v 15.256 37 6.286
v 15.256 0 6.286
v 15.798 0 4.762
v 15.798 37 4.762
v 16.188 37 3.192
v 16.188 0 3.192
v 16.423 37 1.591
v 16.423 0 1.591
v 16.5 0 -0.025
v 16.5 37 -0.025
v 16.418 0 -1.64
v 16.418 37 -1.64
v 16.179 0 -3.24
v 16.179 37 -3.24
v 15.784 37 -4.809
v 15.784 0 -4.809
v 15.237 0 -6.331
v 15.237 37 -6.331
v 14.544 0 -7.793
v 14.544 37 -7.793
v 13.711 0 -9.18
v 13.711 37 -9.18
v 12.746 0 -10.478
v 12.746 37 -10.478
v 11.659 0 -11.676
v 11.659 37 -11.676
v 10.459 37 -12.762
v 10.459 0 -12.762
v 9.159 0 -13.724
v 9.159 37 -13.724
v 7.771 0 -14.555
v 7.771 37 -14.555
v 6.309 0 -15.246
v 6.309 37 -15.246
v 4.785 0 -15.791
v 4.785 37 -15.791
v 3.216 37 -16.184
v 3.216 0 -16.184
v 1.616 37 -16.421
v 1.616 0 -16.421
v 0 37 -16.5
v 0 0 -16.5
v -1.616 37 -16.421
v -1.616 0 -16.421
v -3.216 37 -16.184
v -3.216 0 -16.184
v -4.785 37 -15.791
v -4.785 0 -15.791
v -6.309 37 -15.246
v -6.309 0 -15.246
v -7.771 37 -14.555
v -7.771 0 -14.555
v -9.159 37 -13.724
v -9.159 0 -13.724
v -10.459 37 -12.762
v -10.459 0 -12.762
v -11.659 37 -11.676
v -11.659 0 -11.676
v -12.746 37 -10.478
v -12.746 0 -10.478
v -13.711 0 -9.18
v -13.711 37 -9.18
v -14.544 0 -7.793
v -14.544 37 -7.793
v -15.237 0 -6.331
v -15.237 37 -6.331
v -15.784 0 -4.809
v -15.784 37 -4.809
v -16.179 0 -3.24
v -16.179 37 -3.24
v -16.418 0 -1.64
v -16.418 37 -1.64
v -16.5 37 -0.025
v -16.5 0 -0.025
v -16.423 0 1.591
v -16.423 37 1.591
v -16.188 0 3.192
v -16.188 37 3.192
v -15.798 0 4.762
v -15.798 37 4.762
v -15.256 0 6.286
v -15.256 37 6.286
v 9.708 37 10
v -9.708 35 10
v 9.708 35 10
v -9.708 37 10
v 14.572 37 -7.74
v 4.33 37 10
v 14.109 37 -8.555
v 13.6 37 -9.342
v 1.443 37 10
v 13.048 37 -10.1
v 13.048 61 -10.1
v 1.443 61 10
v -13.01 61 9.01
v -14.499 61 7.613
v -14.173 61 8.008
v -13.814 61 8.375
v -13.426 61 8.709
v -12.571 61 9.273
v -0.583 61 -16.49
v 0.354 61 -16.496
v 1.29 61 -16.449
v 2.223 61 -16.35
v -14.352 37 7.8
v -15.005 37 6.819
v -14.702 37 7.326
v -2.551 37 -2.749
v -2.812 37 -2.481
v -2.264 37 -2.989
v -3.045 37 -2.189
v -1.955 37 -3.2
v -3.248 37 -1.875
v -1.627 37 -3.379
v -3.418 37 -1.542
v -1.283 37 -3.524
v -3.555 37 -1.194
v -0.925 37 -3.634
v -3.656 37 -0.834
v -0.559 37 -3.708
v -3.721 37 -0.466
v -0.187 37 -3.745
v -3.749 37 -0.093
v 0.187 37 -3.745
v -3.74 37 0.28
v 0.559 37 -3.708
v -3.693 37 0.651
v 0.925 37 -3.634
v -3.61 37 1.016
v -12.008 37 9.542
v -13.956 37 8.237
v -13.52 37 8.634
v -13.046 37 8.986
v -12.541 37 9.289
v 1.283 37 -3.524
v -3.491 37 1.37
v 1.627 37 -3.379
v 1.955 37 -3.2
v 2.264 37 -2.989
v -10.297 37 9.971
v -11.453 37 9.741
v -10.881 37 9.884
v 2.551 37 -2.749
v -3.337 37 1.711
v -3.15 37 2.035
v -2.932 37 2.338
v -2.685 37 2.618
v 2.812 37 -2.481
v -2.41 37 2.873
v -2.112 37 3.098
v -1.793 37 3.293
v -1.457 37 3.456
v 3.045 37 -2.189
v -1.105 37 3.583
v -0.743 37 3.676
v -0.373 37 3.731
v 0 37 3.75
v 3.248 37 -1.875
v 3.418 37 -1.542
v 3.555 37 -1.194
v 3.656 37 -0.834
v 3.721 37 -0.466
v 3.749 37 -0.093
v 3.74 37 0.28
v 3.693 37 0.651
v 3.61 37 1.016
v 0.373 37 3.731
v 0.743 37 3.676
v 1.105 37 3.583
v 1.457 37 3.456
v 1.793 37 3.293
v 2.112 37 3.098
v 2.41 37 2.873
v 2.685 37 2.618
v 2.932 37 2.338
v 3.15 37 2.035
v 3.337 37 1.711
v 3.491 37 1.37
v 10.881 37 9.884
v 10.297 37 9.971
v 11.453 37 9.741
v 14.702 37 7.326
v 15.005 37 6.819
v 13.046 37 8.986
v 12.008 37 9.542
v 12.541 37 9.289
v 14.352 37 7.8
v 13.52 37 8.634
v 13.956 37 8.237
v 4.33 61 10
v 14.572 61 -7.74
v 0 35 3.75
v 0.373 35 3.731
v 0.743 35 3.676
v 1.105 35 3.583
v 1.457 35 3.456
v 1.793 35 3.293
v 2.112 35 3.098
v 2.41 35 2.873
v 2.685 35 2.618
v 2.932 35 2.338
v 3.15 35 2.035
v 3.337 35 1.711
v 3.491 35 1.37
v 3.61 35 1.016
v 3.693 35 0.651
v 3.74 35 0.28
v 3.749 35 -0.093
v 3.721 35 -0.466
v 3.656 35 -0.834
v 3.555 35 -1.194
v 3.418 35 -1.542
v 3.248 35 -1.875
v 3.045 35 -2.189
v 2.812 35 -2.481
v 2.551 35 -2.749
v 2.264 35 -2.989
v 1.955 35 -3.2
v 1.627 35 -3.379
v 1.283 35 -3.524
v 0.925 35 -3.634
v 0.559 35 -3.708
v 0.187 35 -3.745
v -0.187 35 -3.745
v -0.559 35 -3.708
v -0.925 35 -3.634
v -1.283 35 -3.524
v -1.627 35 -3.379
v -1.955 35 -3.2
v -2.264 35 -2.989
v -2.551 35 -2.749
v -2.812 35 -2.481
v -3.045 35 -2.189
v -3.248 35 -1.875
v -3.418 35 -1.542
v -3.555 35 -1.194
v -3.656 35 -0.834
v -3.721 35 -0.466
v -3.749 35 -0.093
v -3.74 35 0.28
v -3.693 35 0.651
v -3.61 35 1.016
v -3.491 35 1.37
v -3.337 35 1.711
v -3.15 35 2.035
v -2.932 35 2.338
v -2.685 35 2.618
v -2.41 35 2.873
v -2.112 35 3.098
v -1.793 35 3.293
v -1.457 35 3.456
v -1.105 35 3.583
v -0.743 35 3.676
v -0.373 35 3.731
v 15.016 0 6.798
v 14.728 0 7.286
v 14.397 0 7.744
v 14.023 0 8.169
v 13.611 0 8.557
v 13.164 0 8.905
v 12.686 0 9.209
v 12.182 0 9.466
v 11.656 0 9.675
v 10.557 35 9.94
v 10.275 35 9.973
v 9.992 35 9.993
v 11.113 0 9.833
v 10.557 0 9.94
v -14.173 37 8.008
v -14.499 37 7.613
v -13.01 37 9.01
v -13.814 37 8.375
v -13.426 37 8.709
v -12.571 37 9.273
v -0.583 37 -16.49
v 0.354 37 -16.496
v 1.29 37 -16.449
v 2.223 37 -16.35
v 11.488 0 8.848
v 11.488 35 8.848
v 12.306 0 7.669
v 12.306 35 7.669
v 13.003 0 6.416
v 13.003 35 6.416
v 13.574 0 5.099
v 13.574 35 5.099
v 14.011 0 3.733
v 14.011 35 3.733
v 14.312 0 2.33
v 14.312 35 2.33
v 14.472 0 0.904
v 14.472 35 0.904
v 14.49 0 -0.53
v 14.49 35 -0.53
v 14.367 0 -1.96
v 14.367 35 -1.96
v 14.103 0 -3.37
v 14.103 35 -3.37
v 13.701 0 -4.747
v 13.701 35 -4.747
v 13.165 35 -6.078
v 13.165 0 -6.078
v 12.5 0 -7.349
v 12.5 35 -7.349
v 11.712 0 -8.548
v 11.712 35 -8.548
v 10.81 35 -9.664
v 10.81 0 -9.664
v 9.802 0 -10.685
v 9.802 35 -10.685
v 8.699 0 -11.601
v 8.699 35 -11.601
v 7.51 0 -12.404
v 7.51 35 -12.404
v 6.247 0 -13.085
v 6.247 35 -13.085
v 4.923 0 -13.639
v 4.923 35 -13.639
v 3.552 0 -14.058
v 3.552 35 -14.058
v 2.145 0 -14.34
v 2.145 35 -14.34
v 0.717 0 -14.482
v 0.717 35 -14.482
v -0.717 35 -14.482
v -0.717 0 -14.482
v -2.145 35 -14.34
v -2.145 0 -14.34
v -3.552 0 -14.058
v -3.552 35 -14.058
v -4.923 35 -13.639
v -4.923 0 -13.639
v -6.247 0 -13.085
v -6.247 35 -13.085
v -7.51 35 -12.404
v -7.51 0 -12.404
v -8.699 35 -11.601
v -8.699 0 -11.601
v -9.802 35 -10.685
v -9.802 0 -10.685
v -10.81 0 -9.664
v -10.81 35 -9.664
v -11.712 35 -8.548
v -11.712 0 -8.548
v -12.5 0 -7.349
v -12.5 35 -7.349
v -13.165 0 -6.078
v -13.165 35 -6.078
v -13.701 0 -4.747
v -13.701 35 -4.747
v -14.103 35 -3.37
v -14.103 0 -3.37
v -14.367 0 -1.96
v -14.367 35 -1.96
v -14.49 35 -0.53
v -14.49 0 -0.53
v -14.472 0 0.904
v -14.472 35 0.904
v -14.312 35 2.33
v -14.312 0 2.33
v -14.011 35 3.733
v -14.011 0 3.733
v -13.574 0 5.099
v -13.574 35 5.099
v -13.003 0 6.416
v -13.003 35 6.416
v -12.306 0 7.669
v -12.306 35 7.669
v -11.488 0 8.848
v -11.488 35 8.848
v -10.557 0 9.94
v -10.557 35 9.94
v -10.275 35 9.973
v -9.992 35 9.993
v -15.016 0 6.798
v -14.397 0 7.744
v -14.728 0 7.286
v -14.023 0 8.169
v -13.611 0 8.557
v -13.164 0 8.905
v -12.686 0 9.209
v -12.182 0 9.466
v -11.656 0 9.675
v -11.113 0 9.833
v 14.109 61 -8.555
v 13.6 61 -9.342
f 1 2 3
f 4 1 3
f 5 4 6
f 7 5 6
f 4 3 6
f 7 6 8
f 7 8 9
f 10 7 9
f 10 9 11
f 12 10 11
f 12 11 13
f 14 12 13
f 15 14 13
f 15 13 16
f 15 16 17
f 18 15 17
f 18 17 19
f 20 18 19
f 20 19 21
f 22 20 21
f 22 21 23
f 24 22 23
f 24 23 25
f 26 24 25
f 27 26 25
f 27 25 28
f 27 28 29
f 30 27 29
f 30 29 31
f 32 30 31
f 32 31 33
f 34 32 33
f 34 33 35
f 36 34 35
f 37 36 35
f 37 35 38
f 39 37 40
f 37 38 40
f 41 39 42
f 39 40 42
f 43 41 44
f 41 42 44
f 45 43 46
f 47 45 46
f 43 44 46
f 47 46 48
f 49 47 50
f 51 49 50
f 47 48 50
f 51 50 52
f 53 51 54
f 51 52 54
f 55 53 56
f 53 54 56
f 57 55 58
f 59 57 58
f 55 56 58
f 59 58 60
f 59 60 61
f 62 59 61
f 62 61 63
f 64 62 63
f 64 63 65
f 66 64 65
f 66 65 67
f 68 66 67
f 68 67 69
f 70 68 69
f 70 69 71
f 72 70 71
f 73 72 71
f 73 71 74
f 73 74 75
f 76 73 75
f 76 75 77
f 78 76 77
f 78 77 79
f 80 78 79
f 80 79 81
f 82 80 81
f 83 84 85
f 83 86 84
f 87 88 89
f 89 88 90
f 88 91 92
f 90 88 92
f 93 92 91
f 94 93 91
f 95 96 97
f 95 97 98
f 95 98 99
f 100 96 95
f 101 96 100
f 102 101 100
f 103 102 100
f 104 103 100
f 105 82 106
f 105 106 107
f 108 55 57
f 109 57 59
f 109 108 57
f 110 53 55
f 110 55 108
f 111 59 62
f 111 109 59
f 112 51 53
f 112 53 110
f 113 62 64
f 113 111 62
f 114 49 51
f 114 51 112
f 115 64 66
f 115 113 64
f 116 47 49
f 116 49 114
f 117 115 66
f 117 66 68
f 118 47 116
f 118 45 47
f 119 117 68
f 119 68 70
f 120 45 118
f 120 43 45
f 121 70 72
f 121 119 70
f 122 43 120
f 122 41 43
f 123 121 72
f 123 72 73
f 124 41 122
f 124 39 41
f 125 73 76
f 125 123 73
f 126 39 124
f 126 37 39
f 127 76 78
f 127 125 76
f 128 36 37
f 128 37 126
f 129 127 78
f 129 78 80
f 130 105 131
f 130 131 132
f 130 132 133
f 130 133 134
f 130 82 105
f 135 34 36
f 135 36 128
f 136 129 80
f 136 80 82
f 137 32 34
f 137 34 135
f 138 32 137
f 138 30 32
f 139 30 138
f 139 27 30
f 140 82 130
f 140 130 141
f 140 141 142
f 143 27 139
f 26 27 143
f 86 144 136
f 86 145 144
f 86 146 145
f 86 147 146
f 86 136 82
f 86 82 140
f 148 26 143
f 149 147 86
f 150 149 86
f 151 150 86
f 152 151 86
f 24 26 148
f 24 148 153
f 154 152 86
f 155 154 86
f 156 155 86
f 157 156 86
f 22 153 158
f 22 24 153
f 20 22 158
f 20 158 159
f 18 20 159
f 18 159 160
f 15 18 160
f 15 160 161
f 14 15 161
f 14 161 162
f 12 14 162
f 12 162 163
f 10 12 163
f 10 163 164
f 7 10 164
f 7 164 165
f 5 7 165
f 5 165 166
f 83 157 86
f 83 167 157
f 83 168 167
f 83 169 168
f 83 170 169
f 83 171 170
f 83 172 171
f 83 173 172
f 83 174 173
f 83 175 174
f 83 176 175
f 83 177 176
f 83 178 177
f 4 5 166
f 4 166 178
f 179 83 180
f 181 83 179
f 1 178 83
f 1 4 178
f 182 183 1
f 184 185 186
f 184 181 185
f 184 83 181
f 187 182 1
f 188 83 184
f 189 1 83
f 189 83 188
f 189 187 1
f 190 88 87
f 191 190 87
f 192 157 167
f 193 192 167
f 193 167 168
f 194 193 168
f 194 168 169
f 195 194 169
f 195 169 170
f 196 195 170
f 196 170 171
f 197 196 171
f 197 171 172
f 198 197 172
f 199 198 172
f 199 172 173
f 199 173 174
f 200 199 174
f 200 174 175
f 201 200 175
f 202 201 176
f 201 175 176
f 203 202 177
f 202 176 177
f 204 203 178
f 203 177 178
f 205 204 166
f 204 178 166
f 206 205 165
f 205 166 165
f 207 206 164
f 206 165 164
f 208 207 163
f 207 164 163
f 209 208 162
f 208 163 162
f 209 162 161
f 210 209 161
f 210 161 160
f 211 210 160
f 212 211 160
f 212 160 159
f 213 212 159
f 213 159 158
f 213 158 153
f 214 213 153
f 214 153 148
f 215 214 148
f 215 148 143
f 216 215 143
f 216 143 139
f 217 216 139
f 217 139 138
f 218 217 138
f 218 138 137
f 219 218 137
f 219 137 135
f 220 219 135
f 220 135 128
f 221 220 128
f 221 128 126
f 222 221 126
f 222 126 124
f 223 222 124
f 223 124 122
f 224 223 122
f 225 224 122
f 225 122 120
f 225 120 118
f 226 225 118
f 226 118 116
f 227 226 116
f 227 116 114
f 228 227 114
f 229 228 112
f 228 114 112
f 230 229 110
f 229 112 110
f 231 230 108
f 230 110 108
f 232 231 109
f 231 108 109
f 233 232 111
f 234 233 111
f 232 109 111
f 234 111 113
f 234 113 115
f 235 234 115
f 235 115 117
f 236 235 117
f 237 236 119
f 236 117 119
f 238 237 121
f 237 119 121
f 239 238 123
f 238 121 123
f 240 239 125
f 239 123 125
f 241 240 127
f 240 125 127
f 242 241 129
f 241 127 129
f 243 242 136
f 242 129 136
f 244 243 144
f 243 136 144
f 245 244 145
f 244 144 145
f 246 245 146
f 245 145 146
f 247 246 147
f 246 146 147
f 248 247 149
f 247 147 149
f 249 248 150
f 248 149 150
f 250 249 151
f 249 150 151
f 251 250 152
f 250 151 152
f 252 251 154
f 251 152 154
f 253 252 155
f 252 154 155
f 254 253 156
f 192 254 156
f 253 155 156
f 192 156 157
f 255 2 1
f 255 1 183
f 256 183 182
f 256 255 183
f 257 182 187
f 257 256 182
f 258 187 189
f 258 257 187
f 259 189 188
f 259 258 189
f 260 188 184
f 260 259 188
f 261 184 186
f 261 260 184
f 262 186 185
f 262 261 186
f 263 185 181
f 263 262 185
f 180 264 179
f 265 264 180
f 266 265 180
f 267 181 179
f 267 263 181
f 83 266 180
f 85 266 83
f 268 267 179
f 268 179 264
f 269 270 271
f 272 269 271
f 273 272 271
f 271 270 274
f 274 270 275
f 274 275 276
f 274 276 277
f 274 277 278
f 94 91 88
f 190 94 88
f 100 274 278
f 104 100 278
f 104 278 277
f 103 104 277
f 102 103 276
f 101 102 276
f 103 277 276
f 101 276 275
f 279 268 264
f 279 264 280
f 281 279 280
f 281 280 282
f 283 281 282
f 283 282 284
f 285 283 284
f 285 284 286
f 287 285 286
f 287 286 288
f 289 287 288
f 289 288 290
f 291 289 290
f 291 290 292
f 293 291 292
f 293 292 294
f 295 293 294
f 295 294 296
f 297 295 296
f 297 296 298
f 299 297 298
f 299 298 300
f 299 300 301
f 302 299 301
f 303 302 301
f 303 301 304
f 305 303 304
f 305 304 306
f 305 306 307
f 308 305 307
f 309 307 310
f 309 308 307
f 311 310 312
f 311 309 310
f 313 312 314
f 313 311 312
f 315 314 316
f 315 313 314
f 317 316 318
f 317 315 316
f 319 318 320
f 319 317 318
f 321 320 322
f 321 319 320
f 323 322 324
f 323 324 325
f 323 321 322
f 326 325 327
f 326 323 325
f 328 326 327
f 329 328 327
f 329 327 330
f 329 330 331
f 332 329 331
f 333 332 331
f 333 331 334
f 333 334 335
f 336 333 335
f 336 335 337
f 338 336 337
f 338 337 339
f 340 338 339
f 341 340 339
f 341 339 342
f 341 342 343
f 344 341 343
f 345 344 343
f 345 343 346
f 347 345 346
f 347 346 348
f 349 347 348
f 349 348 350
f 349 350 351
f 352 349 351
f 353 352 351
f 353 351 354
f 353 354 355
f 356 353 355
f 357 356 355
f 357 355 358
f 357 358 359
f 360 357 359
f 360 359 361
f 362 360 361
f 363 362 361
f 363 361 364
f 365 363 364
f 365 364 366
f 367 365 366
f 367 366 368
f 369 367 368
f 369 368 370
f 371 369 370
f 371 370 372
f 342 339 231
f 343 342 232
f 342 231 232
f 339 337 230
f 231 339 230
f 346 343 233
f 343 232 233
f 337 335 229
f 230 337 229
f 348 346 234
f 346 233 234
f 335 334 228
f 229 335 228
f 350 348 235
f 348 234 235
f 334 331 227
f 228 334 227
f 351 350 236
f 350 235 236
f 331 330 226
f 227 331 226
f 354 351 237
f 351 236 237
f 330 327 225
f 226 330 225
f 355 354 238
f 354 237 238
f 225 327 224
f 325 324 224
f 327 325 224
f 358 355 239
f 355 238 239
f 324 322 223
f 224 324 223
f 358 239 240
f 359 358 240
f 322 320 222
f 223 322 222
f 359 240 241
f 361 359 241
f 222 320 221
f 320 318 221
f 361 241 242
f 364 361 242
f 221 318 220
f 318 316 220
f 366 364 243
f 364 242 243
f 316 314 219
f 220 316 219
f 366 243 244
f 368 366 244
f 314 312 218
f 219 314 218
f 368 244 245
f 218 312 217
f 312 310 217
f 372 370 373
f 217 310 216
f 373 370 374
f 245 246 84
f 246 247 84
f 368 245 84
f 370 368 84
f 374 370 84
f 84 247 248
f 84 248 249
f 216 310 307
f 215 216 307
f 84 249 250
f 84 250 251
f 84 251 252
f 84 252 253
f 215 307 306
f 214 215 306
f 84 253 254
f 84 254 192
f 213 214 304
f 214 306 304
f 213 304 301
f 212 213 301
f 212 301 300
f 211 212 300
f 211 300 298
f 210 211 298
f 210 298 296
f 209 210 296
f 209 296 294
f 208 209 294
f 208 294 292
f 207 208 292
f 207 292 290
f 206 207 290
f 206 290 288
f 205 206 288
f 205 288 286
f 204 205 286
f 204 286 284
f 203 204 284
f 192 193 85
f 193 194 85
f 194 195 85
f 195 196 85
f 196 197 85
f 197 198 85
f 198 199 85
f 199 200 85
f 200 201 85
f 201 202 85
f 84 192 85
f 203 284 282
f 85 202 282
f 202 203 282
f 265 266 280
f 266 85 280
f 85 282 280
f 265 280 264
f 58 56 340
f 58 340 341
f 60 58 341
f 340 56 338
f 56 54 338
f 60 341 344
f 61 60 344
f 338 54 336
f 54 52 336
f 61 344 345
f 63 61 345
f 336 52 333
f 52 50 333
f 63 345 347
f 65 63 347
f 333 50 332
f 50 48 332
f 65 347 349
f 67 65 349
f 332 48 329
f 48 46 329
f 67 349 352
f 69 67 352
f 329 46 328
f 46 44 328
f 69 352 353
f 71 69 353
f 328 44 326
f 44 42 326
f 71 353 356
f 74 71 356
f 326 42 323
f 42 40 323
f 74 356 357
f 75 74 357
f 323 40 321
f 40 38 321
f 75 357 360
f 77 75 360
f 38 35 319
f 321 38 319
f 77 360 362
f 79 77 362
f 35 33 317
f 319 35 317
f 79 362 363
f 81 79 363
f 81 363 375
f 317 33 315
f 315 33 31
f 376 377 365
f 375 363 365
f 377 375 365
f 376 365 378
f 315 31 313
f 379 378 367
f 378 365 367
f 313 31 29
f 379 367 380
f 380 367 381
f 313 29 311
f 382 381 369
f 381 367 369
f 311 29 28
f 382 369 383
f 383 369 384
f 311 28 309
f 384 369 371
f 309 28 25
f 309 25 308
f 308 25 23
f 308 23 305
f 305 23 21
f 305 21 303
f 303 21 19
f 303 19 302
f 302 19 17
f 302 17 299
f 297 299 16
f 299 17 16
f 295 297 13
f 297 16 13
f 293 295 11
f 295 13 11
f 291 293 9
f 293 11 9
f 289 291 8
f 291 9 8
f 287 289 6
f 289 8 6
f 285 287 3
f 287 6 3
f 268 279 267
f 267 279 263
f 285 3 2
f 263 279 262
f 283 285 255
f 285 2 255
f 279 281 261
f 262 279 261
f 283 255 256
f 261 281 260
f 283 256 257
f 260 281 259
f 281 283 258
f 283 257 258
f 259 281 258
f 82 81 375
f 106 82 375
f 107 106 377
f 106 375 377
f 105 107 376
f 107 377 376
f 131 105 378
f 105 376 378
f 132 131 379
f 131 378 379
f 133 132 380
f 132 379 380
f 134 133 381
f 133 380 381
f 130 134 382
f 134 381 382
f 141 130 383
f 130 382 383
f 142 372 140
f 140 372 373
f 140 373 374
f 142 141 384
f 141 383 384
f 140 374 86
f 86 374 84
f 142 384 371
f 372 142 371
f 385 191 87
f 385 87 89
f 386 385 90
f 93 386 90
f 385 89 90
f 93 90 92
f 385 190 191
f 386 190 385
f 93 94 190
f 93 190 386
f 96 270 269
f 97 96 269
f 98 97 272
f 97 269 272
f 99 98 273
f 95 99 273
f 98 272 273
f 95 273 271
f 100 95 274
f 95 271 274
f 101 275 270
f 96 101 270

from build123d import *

# Parameters (mm, degrees)
SKETCH_1_R          = 16.5
SKETCH_1_R_2        = 14.5
EXTRUDE_1_DEPTH     = 35
SKETCH_3_R          = 16.5
EXTRUDE_2_DEPTH     = 2
SKETCH_4_W          = 49.747728002
SKETCH_4_H          = 43.690708299
CUT_EXTRUDE_1_DEPTH = 49.40970977
CUT_EXTRUDE_2_REACH = 45.744
SKETCH_5_R          = 3.75
FILLET_1_R          = 6
EXTRUDE_3_DEPTH     = 24
EXTRUDE_3_2_DEPTH   = 24


with BuildPart() as part:
    # 草图1 → 凸台-拉伸1 (new body)
    with BuildSketch(Plane(origin=(0, 0, 0), x_dir=(1, 0, 0), z_dir=(0, 1, 0))):
        with Locations(Location((0, 0, 0), (0, 0, 270))):
            Circle(SKETCH_1_R)
        with Locations(Location((0, 0, 0), (0, 0, 270))):
            Circle(SKETCH_1_R_2, mode=Mode.SUBTRACT)
    extrude(amount=EXTRUDE_1_DEPTH)

    # 草图3 → 凸台-拉伸2 (add)
    with BuildSketch(Plane(origin=(0, 35, 0), x_dir=(1, 0, 0), z_dir=(0, 1, 0))):
        with Locations(Location((0, 0, 0), (0, 0, 270))):
            Circle(SKETCH_3_R)
    extrude(amount=EXTRUDE_2_DEPTH)

    # 草图4 → 切除-拉伸1 (cut, through all)
    with BuildSketch(Plane.XY.offset(10)):
        with Locations((3.540684312, 17.876483266)):
            Rectangle(SKETCH_4_W, SKETCH_4_H)
    extrude(amount=CUT_EXTRUDE_1_DEPTH, mode=Mode.SUBTRACT)

    # 草图5 → 切除-拉伸2 (cut, up to next)
    with BuildSketch(Plane(origin=(0, 37, 0), x_dir=(1, 0, 0), z_dir=(0, 1, 0)), mode=Mode.PRIVATE) as cut_extrude_2_sk1:
        with Locations(Location((0, 0, 0), (0, 0, 270))):
            Circle(SKETCH_5_R)
    cut_extrude_2_tool1 = extrude(cut_extrude_2_sk1.sketch, amount=-CUT_EXTRUDE_2_REACH, mode=Mode.PRIVATE) & part.part
    add(cut_extrude_2_tool1.solids().sort_by_distance((0, 37, 0))[0], mode=Mode.SUBTRACT)

    # 圆角1
    fillet_1_edges = [part.edges().sort_by_distance(p)[0] for p in [
        (13.124404748, 18.5, 10),
        (-13.124404748, 18.5, 10),
    ]]
    fillet(fillet_1_edges, radius=FILLET_1_R)


with BuildPart() as body_2:
    # 草图6 → 凸台-拉伸3 (new body)
    with BuildSketch(Plane(origin=(0, 37, 0), x_dir=(1, 0, 0), z_dir=(0, 1, 0))):
        with BuildLine():
            Line((13.047897801, 10.099621923), (1.443375673, -10))
            Line((1.443375673, -10), (4.330127019, -10))
            Line((4.330127019, -10), (14.5721397, 7.739686335))
            ThreePointArc((14.5721397, 7.739686335), (13.860337004, 8.952153826), (13.047897801, 10.099621923))
        make_face()
    extrude(amount=EXTRUDE_3_DEPTH)


with BuildPart() as body_3:
    # 草图6 → Extrude 3 2 (new body)
    with BuildSketch(Plane(origin=(0, 37, 0), x_dir=(1, 0, 0), z_dir=(0, 1, 0))):
        with BuildLine():
            Line((-0.583304866, 16.489686335), (-14.498767089, -7.612601246))
            ThreePointArc((-14.498767089, -7.612601246), (-13.623792058, -8.546260307), (-12.570735662, -9.273152854))
            Line((-12.570735662, -9.273152854), (2.222580253, 16.349621923))
            ThreePointArc((2.222580253, 16.349621923), (0.82262413, 16.479480864), (-0.583304866, 16.489686335))
        make_face()
    extrude(amount=EXTRUDE_3_2_DEPTH)


solid = Compound([part.part, body_2.part, body_3.part])
